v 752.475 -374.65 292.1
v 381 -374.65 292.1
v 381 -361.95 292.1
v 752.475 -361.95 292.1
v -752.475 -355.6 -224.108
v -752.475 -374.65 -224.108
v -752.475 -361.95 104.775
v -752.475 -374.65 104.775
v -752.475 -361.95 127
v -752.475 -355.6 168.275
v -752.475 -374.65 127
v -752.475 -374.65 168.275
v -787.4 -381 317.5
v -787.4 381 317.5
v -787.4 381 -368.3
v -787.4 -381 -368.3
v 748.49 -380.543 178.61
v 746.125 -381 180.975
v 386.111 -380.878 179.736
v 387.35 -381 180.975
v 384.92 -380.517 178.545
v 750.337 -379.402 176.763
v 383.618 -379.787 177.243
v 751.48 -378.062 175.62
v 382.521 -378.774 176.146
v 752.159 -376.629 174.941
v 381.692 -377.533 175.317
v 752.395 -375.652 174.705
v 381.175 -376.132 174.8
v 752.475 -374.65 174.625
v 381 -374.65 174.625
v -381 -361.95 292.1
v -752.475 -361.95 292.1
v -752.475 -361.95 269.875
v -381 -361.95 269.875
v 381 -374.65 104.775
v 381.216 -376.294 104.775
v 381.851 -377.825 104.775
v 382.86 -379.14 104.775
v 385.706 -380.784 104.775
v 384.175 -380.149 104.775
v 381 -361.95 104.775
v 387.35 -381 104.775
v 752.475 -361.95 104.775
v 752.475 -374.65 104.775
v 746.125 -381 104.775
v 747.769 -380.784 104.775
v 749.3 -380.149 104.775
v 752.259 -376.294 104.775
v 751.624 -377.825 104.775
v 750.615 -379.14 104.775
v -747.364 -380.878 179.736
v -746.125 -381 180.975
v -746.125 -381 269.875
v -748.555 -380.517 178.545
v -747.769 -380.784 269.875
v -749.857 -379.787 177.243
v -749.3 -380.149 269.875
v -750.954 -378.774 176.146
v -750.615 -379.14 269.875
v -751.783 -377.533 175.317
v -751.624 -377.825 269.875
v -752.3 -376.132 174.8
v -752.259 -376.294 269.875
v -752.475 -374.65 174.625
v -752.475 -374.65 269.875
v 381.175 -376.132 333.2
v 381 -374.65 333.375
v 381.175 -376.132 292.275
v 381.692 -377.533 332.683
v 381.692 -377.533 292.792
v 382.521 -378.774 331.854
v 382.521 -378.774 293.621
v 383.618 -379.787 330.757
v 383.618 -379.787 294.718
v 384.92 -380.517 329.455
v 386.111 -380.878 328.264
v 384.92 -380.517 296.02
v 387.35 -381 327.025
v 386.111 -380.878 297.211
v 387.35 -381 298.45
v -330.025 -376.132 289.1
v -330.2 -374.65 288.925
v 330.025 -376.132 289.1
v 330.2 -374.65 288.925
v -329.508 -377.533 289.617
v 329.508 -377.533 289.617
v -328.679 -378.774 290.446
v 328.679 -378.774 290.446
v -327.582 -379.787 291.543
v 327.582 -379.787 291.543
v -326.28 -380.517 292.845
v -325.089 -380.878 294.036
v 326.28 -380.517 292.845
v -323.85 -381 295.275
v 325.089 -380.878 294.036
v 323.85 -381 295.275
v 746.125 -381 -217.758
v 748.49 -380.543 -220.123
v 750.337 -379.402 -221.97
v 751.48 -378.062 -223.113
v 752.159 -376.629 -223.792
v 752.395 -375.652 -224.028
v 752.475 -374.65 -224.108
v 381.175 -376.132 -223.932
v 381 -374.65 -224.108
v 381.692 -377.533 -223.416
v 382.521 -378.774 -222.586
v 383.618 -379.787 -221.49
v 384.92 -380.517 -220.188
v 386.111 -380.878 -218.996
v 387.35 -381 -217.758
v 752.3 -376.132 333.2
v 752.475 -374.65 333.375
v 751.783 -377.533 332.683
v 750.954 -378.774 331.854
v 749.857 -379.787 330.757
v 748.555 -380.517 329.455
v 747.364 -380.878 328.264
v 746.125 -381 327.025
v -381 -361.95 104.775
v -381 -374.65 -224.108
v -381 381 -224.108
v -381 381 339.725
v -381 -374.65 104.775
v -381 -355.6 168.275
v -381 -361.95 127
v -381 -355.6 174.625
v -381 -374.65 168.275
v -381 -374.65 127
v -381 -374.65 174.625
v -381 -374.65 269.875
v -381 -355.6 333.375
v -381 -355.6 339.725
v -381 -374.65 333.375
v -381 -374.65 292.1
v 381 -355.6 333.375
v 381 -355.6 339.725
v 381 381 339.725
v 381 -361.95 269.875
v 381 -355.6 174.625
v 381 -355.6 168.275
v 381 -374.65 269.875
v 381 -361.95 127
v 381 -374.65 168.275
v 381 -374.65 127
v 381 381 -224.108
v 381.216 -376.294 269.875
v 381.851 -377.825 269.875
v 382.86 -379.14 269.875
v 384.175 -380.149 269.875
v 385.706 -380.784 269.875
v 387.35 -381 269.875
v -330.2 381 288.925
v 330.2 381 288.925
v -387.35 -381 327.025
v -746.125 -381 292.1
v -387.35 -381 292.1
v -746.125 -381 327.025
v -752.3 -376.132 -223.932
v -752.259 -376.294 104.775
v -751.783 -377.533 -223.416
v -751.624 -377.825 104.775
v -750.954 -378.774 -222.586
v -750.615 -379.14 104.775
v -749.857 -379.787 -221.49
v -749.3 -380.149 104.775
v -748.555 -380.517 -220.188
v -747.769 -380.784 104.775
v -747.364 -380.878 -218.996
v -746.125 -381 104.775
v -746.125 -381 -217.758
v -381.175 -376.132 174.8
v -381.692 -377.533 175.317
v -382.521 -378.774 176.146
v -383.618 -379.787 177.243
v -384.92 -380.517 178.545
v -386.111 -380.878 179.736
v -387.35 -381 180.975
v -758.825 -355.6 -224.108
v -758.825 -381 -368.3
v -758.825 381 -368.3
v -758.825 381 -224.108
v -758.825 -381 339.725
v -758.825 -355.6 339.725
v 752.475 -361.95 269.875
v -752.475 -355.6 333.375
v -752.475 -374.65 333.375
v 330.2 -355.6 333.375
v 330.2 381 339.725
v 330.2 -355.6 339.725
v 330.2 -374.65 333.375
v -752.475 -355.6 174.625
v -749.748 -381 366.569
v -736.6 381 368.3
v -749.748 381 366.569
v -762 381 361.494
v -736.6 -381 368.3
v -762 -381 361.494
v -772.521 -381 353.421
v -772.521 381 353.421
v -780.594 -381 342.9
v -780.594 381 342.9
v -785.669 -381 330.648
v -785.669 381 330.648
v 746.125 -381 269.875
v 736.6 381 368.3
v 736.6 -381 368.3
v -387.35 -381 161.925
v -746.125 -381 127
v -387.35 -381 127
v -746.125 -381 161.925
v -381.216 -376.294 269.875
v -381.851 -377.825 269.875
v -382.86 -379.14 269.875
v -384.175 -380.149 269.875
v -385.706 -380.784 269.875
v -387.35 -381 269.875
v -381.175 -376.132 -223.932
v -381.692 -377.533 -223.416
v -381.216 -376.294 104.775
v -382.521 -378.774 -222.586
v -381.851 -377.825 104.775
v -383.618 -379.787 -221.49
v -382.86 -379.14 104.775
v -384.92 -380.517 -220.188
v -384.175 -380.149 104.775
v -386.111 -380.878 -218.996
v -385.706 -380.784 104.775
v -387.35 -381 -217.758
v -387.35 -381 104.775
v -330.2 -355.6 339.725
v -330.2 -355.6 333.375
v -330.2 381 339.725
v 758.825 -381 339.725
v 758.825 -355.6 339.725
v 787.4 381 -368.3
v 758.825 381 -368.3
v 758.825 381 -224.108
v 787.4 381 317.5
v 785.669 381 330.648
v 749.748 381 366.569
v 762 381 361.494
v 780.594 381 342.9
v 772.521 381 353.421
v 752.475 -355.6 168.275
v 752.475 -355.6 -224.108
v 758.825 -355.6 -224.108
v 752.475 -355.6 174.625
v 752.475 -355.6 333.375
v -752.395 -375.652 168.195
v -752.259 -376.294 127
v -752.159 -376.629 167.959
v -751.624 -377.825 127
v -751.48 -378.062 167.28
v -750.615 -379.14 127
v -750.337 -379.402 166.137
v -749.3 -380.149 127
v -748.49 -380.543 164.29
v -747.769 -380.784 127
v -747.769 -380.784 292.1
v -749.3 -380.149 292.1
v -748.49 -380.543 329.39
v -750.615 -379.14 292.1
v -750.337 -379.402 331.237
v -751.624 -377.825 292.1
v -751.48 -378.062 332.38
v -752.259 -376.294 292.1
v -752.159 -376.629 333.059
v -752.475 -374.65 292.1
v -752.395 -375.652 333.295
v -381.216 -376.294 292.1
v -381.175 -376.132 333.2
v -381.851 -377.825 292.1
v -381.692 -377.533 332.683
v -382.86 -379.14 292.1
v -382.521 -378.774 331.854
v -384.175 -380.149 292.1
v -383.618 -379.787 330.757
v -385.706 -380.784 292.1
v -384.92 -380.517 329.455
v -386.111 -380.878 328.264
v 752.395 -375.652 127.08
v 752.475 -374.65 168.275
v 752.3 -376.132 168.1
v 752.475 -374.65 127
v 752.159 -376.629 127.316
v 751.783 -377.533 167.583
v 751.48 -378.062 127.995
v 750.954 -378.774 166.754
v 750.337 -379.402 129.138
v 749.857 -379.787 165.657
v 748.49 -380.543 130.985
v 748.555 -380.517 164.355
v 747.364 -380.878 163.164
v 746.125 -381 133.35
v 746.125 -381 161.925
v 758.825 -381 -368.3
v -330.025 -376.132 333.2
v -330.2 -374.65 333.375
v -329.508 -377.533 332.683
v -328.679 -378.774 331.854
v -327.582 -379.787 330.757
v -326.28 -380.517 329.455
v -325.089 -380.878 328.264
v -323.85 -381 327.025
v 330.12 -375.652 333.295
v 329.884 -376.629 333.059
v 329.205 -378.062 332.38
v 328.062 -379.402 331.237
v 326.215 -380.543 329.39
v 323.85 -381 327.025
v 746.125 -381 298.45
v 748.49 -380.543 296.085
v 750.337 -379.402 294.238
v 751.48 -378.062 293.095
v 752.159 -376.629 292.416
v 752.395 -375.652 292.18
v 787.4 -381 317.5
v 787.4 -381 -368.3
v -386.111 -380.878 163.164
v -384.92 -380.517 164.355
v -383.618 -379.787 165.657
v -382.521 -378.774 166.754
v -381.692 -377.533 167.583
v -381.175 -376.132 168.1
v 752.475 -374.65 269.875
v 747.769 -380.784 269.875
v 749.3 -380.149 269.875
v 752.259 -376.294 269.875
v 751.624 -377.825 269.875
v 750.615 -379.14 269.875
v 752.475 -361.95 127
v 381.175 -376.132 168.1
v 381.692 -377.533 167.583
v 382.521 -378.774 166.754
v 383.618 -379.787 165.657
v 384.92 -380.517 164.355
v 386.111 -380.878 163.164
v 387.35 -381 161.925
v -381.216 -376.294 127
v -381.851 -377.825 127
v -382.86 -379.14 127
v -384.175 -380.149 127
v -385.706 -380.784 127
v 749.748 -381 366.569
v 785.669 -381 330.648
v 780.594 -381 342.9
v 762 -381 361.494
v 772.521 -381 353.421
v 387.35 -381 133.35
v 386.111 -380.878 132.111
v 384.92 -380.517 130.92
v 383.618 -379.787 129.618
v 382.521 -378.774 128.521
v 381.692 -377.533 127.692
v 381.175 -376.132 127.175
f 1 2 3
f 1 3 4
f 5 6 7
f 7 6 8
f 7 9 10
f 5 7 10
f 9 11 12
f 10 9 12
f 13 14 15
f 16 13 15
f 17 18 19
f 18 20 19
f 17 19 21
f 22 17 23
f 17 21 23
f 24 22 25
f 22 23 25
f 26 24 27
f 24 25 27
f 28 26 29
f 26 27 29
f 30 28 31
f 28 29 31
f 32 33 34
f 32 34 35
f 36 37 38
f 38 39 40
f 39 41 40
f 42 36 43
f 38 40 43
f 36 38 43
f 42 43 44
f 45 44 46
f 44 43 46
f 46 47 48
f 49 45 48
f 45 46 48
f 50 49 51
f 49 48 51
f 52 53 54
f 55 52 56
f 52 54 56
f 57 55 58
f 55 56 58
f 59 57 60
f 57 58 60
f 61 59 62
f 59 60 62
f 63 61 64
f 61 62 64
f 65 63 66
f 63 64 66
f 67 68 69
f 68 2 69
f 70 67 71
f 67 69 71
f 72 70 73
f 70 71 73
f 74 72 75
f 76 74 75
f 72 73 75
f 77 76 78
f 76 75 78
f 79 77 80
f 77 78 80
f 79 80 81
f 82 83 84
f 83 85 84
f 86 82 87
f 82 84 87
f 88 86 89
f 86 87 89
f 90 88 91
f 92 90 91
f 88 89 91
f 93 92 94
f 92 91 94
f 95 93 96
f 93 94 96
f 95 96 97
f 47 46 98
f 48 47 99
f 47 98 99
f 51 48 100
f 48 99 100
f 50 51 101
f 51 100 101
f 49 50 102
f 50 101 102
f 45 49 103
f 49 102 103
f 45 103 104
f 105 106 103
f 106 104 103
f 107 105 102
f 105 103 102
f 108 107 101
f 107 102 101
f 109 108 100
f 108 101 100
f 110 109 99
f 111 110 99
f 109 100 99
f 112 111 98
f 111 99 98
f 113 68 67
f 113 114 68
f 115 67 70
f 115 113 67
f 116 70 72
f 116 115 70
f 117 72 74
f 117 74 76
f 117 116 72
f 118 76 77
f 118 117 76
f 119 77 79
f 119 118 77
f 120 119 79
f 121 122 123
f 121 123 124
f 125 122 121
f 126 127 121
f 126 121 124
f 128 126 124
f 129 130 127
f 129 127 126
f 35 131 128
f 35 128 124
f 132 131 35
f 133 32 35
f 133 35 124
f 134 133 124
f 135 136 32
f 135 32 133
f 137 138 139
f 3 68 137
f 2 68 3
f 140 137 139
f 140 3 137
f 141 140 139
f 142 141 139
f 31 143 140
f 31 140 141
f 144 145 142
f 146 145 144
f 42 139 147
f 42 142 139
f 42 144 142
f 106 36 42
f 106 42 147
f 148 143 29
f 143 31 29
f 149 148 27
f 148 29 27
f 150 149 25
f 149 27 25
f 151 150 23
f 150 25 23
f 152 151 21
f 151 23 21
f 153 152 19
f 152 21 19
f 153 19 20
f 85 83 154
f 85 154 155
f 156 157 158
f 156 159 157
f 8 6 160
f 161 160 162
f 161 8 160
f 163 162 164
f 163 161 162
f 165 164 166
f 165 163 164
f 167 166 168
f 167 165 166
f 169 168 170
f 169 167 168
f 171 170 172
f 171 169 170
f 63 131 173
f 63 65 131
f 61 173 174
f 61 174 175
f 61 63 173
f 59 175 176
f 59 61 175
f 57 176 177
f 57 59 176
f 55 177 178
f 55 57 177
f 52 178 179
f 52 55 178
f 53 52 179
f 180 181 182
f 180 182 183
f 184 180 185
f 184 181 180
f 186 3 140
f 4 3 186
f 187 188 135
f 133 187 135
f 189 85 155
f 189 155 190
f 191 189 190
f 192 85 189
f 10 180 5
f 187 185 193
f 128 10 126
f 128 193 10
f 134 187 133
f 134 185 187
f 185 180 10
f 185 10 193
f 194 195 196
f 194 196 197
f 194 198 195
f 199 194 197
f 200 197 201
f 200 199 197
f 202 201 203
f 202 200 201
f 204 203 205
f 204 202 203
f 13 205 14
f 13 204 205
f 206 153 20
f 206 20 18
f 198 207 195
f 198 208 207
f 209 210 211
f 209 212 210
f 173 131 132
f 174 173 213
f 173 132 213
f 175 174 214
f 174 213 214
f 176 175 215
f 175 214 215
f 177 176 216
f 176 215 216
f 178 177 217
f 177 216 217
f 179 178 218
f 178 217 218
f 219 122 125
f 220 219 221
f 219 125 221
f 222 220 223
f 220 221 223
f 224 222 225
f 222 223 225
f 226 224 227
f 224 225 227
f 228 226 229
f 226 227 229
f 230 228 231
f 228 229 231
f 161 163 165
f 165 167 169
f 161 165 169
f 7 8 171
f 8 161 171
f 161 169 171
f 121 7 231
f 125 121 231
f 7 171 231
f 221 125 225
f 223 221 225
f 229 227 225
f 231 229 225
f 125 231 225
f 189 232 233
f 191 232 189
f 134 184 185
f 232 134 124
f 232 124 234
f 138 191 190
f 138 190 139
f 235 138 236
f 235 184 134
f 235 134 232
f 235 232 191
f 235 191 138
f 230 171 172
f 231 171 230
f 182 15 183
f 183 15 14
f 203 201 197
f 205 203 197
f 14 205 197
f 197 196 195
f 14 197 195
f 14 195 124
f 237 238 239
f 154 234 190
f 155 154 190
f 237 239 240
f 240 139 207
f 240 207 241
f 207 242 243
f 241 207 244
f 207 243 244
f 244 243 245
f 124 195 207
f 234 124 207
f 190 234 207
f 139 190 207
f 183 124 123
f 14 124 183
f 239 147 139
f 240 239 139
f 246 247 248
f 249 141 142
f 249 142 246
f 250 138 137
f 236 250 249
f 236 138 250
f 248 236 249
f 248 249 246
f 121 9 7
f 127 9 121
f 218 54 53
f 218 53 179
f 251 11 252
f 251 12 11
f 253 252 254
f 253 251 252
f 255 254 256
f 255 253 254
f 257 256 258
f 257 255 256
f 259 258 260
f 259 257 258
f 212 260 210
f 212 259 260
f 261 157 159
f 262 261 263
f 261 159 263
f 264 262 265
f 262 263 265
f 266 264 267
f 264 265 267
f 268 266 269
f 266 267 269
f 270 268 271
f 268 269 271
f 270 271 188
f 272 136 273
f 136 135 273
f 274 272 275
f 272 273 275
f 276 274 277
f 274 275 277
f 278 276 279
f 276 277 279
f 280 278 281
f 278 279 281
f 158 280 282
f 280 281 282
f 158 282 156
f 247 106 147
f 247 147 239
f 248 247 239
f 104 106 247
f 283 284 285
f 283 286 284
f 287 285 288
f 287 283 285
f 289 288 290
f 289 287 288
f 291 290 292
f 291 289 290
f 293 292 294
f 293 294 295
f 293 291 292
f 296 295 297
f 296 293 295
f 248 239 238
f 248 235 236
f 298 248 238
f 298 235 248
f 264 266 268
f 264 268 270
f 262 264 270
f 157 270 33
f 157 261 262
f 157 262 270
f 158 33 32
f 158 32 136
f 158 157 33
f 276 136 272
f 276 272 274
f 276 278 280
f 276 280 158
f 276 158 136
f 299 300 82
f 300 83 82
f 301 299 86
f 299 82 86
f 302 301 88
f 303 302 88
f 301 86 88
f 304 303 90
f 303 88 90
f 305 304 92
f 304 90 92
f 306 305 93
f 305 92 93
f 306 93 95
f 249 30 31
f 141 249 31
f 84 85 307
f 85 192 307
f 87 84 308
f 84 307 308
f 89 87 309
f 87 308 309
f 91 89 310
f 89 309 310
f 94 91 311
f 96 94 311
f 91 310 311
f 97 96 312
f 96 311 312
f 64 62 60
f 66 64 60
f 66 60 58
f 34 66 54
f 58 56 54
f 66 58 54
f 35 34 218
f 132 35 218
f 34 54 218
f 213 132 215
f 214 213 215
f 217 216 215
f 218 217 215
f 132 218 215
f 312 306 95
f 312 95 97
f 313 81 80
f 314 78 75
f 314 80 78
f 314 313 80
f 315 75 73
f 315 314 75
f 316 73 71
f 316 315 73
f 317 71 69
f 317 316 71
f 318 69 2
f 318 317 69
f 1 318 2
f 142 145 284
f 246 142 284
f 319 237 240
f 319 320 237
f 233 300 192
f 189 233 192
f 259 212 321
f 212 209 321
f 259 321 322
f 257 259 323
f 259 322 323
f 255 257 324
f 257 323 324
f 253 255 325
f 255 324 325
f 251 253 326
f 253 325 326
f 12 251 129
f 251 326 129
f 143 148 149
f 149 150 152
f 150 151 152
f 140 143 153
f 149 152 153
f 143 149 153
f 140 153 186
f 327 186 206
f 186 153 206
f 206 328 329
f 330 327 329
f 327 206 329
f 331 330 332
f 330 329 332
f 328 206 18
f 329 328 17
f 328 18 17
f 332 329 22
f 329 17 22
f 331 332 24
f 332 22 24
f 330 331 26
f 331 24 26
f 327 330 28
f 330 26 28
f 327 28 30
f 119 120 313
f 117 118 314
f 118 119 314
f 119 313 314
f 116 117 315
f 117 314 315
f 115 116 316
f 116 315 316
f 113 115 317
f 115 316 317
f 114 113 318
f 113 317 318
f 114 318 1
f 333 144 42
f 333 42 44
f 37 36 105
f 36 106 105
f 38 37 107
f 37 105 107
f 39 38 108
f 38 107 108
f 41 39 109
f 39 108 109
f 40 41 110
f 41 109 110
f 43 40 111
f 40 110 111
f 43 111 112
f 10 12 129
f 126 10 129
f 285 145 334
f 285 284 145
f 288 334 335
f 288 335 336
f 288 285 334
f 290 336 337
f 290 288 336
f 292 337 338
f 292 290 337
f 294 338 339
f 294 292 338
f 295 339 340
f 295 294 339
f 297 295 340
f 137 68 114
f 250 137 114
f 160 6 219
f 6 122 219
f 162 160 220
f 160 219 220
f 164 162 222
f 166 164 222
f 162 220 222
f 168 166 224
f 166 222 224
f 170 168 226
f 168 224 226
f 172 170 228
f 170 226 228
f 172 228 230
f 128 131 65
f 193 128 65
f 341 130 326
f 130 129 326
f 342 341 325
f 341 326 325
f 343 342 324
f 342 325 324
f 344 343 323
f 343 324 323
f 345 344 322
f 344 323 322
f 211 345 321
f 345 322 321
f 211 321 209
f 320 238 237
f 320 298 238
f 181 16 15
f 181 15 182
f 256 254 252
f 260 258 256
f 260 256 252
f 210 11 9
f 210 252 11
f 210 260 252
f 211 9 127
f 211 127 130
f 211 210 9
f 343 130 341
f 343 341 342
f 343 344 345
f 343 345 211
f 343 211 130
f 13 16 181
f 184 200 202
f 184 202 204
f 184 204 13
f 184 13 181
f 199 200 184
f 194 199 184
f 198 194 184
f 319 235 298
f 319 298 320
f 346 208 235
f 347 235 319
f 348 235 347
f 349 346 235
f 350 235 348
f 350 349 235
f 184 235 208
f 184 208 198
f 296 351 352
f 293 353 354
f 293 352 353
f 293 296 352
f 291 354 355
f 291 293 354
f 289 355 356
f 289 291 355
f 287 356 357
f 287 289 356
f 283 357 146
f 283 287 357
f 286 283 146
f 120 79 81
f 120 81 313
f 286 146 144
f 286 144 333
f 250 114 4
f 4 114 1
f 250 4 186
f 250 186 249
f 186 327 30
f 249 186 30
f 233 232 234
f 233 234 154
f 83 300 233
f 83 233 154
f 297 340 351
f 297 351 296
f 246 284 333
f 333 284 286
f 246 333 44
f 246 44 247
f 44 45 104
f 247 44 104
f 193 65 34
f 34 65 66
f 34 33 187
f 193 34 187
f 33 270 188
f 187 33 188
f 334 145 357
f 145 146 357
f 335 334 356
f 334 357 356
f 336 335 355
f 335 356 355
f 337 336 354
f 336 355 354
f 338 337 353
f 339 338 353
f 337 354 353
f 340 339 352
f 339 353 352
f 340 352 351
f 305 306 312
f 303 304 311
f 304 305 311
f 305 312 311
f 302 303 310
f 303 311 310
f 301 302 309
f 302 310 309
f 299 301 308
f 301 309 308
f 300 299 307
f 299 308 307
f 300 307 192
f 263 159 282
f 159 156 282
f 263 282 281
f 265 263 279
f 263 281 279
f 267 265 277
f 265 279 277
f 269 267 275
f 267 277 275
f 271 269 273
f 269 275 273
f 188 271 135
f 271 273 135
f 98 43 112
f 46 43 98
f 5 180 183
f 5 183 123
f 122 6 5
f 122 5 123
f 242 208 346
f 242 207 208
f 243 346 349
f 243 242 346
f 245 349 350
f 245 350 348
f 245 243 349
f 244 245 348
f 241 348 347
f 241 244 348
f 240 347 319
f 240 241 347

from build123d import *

# Parameters (mm, degrees)
F1_DEPTH = 381
F2_R     = 50.8
F3_W     = 660.4
F3_H     = 6.35
F4_DEPTH = 25.4
F3_W_2   = 371.475
F3_H_2   = 22.225
F5_DEPTH = 19.05
F6_R     = 6.35


with BuildPart() as f1:
    # F0 (on Front) → F1 (new body, symmetric)
    with BuildSketch(Plane.XZ):
        Polygon((787.4, 368.3), (-787.4, 368.3), (-787.4, -368.3), (-758.825, -368.3), (-758.825, -224.1076678038), (-381, -224.1076678038), (-381, 339.725), (-330.2, 339.725), (-330.2, 288.925), (330.2, 288.925), (330.2, 339.725), (381, 339.725), (381, -224.1076678038), (758.825, -224.1076678038), (758.825, -368.3), (787.4, -368.3), align=None)
    extrude(amount=F1_DEPTH, both=True)

    # F2
    f2_edges = [f1.edges().sort_by_distance(p)[0] for p in [
        (787.4, 0, 368.3),
        (-787.4, 0, 368.3),
    ]]
    fillet(f2_edges, radius=F2_R)

    # F3 (on face) → F4 (cut)
    with BuildSketch(Plane.XZ.offset(381)):
        Polygon((-758.825, 339.725), (-758.825, -224.1076678038), (-752.475, -224.1076678038), (-752.475, 104.775), (-752.475, 127), (-752.475, 168.275), (-381, 168.275), (-381, 174.625), (-752.475, 174.625), (-752.475, 269.875), (-752.475, 292.1), (-752.475, 333.375), (-381, 333.375), (-381, 339.725), align=None)
        with Locations((0, 336.55)):
            Rectangle(F3_W, F3_H)
        Polygon((758.825, 339.725), (381, 339.725), (381, 333.375), (752.475, 333.375), (752.475, 292.1), (752.475, 269.875), (752.475, 174.625), (381, 174.625), (381, 168.275), (752.475, 168.275), (752.475, 127), (752.475, 104.775), (752.475, -224.1076678038), (758.825, -224.1076678038), align=None)
    extrude(amount=-F4_DEPTH, mode=Mode.SUBTRACT)

    # F3 (on face) → F5 (cut)
    with BuildSketch(Plane.XZ.offset(381)):
        with Locations((-566.7375, 115.8875)):
            Rectangle(F3_W_2, F3_H_2)
        with Locations((-566.7375, 280.9875)):
            Rectangle(F3_W_2, F3_H_2)
        with Locations((566.7375, 280.9875)):
            Rectangle(F3_W_2, F3_H_2)
        with Locations((566.7375, 115.8875)):
            Rectangle(F3_W_2, F3_H_2)
    extrude(amount=-F5_DEPTH, mode=Mode.SUBTRACT)

    # F6
    f6_edges = [f1.edges().sort_by_distance(p)[0] for p in [
        (-566.7375, -381, -224.107668),
        (-381, -381, -59.666334),
        (-381, -381, 147.6375),
        (-381, -381, 222.25),
        (-566.7375, -381, 168.275),
        (-566.7375, -381, 174.625),
        (-381, -381, 312.7375),
        (-566.7375, -381, 333.375),
        (-752.475, -381, 312.7375),
        (-752.475, -381, 222.25),
        (-752.475, -381, 147.6375),
        (-752.475, -381, -59.666334),
        (-330.2, -381, 311.15),
        (0, -381, 288.925),
        (0, -381, 333.375),
        (330.2, -381, 311.15),
        (566.7375, -381, 333.375),
        (381, -381, 312.7375),
        (566.7375, -381, 292.1),
        (752.475, -381, 312.7375),
        (381, -381, 222.25),
        (566.7375, -381, 174.625),
        (752.475, -381, 222.25),
        (566.7375, -381, 168.275),
        (381, -381, 147.6375),
        (566.7375, -381, 127),
        (752.475, -381, 147.6375),
        (381, -381, -59.666334),
        (752.475, -381, -59.666334),
        (566.7375, -381, -224.107668),
    ]]
    fillet(f6_edges, radius=F6_R)


solid = f1.part
